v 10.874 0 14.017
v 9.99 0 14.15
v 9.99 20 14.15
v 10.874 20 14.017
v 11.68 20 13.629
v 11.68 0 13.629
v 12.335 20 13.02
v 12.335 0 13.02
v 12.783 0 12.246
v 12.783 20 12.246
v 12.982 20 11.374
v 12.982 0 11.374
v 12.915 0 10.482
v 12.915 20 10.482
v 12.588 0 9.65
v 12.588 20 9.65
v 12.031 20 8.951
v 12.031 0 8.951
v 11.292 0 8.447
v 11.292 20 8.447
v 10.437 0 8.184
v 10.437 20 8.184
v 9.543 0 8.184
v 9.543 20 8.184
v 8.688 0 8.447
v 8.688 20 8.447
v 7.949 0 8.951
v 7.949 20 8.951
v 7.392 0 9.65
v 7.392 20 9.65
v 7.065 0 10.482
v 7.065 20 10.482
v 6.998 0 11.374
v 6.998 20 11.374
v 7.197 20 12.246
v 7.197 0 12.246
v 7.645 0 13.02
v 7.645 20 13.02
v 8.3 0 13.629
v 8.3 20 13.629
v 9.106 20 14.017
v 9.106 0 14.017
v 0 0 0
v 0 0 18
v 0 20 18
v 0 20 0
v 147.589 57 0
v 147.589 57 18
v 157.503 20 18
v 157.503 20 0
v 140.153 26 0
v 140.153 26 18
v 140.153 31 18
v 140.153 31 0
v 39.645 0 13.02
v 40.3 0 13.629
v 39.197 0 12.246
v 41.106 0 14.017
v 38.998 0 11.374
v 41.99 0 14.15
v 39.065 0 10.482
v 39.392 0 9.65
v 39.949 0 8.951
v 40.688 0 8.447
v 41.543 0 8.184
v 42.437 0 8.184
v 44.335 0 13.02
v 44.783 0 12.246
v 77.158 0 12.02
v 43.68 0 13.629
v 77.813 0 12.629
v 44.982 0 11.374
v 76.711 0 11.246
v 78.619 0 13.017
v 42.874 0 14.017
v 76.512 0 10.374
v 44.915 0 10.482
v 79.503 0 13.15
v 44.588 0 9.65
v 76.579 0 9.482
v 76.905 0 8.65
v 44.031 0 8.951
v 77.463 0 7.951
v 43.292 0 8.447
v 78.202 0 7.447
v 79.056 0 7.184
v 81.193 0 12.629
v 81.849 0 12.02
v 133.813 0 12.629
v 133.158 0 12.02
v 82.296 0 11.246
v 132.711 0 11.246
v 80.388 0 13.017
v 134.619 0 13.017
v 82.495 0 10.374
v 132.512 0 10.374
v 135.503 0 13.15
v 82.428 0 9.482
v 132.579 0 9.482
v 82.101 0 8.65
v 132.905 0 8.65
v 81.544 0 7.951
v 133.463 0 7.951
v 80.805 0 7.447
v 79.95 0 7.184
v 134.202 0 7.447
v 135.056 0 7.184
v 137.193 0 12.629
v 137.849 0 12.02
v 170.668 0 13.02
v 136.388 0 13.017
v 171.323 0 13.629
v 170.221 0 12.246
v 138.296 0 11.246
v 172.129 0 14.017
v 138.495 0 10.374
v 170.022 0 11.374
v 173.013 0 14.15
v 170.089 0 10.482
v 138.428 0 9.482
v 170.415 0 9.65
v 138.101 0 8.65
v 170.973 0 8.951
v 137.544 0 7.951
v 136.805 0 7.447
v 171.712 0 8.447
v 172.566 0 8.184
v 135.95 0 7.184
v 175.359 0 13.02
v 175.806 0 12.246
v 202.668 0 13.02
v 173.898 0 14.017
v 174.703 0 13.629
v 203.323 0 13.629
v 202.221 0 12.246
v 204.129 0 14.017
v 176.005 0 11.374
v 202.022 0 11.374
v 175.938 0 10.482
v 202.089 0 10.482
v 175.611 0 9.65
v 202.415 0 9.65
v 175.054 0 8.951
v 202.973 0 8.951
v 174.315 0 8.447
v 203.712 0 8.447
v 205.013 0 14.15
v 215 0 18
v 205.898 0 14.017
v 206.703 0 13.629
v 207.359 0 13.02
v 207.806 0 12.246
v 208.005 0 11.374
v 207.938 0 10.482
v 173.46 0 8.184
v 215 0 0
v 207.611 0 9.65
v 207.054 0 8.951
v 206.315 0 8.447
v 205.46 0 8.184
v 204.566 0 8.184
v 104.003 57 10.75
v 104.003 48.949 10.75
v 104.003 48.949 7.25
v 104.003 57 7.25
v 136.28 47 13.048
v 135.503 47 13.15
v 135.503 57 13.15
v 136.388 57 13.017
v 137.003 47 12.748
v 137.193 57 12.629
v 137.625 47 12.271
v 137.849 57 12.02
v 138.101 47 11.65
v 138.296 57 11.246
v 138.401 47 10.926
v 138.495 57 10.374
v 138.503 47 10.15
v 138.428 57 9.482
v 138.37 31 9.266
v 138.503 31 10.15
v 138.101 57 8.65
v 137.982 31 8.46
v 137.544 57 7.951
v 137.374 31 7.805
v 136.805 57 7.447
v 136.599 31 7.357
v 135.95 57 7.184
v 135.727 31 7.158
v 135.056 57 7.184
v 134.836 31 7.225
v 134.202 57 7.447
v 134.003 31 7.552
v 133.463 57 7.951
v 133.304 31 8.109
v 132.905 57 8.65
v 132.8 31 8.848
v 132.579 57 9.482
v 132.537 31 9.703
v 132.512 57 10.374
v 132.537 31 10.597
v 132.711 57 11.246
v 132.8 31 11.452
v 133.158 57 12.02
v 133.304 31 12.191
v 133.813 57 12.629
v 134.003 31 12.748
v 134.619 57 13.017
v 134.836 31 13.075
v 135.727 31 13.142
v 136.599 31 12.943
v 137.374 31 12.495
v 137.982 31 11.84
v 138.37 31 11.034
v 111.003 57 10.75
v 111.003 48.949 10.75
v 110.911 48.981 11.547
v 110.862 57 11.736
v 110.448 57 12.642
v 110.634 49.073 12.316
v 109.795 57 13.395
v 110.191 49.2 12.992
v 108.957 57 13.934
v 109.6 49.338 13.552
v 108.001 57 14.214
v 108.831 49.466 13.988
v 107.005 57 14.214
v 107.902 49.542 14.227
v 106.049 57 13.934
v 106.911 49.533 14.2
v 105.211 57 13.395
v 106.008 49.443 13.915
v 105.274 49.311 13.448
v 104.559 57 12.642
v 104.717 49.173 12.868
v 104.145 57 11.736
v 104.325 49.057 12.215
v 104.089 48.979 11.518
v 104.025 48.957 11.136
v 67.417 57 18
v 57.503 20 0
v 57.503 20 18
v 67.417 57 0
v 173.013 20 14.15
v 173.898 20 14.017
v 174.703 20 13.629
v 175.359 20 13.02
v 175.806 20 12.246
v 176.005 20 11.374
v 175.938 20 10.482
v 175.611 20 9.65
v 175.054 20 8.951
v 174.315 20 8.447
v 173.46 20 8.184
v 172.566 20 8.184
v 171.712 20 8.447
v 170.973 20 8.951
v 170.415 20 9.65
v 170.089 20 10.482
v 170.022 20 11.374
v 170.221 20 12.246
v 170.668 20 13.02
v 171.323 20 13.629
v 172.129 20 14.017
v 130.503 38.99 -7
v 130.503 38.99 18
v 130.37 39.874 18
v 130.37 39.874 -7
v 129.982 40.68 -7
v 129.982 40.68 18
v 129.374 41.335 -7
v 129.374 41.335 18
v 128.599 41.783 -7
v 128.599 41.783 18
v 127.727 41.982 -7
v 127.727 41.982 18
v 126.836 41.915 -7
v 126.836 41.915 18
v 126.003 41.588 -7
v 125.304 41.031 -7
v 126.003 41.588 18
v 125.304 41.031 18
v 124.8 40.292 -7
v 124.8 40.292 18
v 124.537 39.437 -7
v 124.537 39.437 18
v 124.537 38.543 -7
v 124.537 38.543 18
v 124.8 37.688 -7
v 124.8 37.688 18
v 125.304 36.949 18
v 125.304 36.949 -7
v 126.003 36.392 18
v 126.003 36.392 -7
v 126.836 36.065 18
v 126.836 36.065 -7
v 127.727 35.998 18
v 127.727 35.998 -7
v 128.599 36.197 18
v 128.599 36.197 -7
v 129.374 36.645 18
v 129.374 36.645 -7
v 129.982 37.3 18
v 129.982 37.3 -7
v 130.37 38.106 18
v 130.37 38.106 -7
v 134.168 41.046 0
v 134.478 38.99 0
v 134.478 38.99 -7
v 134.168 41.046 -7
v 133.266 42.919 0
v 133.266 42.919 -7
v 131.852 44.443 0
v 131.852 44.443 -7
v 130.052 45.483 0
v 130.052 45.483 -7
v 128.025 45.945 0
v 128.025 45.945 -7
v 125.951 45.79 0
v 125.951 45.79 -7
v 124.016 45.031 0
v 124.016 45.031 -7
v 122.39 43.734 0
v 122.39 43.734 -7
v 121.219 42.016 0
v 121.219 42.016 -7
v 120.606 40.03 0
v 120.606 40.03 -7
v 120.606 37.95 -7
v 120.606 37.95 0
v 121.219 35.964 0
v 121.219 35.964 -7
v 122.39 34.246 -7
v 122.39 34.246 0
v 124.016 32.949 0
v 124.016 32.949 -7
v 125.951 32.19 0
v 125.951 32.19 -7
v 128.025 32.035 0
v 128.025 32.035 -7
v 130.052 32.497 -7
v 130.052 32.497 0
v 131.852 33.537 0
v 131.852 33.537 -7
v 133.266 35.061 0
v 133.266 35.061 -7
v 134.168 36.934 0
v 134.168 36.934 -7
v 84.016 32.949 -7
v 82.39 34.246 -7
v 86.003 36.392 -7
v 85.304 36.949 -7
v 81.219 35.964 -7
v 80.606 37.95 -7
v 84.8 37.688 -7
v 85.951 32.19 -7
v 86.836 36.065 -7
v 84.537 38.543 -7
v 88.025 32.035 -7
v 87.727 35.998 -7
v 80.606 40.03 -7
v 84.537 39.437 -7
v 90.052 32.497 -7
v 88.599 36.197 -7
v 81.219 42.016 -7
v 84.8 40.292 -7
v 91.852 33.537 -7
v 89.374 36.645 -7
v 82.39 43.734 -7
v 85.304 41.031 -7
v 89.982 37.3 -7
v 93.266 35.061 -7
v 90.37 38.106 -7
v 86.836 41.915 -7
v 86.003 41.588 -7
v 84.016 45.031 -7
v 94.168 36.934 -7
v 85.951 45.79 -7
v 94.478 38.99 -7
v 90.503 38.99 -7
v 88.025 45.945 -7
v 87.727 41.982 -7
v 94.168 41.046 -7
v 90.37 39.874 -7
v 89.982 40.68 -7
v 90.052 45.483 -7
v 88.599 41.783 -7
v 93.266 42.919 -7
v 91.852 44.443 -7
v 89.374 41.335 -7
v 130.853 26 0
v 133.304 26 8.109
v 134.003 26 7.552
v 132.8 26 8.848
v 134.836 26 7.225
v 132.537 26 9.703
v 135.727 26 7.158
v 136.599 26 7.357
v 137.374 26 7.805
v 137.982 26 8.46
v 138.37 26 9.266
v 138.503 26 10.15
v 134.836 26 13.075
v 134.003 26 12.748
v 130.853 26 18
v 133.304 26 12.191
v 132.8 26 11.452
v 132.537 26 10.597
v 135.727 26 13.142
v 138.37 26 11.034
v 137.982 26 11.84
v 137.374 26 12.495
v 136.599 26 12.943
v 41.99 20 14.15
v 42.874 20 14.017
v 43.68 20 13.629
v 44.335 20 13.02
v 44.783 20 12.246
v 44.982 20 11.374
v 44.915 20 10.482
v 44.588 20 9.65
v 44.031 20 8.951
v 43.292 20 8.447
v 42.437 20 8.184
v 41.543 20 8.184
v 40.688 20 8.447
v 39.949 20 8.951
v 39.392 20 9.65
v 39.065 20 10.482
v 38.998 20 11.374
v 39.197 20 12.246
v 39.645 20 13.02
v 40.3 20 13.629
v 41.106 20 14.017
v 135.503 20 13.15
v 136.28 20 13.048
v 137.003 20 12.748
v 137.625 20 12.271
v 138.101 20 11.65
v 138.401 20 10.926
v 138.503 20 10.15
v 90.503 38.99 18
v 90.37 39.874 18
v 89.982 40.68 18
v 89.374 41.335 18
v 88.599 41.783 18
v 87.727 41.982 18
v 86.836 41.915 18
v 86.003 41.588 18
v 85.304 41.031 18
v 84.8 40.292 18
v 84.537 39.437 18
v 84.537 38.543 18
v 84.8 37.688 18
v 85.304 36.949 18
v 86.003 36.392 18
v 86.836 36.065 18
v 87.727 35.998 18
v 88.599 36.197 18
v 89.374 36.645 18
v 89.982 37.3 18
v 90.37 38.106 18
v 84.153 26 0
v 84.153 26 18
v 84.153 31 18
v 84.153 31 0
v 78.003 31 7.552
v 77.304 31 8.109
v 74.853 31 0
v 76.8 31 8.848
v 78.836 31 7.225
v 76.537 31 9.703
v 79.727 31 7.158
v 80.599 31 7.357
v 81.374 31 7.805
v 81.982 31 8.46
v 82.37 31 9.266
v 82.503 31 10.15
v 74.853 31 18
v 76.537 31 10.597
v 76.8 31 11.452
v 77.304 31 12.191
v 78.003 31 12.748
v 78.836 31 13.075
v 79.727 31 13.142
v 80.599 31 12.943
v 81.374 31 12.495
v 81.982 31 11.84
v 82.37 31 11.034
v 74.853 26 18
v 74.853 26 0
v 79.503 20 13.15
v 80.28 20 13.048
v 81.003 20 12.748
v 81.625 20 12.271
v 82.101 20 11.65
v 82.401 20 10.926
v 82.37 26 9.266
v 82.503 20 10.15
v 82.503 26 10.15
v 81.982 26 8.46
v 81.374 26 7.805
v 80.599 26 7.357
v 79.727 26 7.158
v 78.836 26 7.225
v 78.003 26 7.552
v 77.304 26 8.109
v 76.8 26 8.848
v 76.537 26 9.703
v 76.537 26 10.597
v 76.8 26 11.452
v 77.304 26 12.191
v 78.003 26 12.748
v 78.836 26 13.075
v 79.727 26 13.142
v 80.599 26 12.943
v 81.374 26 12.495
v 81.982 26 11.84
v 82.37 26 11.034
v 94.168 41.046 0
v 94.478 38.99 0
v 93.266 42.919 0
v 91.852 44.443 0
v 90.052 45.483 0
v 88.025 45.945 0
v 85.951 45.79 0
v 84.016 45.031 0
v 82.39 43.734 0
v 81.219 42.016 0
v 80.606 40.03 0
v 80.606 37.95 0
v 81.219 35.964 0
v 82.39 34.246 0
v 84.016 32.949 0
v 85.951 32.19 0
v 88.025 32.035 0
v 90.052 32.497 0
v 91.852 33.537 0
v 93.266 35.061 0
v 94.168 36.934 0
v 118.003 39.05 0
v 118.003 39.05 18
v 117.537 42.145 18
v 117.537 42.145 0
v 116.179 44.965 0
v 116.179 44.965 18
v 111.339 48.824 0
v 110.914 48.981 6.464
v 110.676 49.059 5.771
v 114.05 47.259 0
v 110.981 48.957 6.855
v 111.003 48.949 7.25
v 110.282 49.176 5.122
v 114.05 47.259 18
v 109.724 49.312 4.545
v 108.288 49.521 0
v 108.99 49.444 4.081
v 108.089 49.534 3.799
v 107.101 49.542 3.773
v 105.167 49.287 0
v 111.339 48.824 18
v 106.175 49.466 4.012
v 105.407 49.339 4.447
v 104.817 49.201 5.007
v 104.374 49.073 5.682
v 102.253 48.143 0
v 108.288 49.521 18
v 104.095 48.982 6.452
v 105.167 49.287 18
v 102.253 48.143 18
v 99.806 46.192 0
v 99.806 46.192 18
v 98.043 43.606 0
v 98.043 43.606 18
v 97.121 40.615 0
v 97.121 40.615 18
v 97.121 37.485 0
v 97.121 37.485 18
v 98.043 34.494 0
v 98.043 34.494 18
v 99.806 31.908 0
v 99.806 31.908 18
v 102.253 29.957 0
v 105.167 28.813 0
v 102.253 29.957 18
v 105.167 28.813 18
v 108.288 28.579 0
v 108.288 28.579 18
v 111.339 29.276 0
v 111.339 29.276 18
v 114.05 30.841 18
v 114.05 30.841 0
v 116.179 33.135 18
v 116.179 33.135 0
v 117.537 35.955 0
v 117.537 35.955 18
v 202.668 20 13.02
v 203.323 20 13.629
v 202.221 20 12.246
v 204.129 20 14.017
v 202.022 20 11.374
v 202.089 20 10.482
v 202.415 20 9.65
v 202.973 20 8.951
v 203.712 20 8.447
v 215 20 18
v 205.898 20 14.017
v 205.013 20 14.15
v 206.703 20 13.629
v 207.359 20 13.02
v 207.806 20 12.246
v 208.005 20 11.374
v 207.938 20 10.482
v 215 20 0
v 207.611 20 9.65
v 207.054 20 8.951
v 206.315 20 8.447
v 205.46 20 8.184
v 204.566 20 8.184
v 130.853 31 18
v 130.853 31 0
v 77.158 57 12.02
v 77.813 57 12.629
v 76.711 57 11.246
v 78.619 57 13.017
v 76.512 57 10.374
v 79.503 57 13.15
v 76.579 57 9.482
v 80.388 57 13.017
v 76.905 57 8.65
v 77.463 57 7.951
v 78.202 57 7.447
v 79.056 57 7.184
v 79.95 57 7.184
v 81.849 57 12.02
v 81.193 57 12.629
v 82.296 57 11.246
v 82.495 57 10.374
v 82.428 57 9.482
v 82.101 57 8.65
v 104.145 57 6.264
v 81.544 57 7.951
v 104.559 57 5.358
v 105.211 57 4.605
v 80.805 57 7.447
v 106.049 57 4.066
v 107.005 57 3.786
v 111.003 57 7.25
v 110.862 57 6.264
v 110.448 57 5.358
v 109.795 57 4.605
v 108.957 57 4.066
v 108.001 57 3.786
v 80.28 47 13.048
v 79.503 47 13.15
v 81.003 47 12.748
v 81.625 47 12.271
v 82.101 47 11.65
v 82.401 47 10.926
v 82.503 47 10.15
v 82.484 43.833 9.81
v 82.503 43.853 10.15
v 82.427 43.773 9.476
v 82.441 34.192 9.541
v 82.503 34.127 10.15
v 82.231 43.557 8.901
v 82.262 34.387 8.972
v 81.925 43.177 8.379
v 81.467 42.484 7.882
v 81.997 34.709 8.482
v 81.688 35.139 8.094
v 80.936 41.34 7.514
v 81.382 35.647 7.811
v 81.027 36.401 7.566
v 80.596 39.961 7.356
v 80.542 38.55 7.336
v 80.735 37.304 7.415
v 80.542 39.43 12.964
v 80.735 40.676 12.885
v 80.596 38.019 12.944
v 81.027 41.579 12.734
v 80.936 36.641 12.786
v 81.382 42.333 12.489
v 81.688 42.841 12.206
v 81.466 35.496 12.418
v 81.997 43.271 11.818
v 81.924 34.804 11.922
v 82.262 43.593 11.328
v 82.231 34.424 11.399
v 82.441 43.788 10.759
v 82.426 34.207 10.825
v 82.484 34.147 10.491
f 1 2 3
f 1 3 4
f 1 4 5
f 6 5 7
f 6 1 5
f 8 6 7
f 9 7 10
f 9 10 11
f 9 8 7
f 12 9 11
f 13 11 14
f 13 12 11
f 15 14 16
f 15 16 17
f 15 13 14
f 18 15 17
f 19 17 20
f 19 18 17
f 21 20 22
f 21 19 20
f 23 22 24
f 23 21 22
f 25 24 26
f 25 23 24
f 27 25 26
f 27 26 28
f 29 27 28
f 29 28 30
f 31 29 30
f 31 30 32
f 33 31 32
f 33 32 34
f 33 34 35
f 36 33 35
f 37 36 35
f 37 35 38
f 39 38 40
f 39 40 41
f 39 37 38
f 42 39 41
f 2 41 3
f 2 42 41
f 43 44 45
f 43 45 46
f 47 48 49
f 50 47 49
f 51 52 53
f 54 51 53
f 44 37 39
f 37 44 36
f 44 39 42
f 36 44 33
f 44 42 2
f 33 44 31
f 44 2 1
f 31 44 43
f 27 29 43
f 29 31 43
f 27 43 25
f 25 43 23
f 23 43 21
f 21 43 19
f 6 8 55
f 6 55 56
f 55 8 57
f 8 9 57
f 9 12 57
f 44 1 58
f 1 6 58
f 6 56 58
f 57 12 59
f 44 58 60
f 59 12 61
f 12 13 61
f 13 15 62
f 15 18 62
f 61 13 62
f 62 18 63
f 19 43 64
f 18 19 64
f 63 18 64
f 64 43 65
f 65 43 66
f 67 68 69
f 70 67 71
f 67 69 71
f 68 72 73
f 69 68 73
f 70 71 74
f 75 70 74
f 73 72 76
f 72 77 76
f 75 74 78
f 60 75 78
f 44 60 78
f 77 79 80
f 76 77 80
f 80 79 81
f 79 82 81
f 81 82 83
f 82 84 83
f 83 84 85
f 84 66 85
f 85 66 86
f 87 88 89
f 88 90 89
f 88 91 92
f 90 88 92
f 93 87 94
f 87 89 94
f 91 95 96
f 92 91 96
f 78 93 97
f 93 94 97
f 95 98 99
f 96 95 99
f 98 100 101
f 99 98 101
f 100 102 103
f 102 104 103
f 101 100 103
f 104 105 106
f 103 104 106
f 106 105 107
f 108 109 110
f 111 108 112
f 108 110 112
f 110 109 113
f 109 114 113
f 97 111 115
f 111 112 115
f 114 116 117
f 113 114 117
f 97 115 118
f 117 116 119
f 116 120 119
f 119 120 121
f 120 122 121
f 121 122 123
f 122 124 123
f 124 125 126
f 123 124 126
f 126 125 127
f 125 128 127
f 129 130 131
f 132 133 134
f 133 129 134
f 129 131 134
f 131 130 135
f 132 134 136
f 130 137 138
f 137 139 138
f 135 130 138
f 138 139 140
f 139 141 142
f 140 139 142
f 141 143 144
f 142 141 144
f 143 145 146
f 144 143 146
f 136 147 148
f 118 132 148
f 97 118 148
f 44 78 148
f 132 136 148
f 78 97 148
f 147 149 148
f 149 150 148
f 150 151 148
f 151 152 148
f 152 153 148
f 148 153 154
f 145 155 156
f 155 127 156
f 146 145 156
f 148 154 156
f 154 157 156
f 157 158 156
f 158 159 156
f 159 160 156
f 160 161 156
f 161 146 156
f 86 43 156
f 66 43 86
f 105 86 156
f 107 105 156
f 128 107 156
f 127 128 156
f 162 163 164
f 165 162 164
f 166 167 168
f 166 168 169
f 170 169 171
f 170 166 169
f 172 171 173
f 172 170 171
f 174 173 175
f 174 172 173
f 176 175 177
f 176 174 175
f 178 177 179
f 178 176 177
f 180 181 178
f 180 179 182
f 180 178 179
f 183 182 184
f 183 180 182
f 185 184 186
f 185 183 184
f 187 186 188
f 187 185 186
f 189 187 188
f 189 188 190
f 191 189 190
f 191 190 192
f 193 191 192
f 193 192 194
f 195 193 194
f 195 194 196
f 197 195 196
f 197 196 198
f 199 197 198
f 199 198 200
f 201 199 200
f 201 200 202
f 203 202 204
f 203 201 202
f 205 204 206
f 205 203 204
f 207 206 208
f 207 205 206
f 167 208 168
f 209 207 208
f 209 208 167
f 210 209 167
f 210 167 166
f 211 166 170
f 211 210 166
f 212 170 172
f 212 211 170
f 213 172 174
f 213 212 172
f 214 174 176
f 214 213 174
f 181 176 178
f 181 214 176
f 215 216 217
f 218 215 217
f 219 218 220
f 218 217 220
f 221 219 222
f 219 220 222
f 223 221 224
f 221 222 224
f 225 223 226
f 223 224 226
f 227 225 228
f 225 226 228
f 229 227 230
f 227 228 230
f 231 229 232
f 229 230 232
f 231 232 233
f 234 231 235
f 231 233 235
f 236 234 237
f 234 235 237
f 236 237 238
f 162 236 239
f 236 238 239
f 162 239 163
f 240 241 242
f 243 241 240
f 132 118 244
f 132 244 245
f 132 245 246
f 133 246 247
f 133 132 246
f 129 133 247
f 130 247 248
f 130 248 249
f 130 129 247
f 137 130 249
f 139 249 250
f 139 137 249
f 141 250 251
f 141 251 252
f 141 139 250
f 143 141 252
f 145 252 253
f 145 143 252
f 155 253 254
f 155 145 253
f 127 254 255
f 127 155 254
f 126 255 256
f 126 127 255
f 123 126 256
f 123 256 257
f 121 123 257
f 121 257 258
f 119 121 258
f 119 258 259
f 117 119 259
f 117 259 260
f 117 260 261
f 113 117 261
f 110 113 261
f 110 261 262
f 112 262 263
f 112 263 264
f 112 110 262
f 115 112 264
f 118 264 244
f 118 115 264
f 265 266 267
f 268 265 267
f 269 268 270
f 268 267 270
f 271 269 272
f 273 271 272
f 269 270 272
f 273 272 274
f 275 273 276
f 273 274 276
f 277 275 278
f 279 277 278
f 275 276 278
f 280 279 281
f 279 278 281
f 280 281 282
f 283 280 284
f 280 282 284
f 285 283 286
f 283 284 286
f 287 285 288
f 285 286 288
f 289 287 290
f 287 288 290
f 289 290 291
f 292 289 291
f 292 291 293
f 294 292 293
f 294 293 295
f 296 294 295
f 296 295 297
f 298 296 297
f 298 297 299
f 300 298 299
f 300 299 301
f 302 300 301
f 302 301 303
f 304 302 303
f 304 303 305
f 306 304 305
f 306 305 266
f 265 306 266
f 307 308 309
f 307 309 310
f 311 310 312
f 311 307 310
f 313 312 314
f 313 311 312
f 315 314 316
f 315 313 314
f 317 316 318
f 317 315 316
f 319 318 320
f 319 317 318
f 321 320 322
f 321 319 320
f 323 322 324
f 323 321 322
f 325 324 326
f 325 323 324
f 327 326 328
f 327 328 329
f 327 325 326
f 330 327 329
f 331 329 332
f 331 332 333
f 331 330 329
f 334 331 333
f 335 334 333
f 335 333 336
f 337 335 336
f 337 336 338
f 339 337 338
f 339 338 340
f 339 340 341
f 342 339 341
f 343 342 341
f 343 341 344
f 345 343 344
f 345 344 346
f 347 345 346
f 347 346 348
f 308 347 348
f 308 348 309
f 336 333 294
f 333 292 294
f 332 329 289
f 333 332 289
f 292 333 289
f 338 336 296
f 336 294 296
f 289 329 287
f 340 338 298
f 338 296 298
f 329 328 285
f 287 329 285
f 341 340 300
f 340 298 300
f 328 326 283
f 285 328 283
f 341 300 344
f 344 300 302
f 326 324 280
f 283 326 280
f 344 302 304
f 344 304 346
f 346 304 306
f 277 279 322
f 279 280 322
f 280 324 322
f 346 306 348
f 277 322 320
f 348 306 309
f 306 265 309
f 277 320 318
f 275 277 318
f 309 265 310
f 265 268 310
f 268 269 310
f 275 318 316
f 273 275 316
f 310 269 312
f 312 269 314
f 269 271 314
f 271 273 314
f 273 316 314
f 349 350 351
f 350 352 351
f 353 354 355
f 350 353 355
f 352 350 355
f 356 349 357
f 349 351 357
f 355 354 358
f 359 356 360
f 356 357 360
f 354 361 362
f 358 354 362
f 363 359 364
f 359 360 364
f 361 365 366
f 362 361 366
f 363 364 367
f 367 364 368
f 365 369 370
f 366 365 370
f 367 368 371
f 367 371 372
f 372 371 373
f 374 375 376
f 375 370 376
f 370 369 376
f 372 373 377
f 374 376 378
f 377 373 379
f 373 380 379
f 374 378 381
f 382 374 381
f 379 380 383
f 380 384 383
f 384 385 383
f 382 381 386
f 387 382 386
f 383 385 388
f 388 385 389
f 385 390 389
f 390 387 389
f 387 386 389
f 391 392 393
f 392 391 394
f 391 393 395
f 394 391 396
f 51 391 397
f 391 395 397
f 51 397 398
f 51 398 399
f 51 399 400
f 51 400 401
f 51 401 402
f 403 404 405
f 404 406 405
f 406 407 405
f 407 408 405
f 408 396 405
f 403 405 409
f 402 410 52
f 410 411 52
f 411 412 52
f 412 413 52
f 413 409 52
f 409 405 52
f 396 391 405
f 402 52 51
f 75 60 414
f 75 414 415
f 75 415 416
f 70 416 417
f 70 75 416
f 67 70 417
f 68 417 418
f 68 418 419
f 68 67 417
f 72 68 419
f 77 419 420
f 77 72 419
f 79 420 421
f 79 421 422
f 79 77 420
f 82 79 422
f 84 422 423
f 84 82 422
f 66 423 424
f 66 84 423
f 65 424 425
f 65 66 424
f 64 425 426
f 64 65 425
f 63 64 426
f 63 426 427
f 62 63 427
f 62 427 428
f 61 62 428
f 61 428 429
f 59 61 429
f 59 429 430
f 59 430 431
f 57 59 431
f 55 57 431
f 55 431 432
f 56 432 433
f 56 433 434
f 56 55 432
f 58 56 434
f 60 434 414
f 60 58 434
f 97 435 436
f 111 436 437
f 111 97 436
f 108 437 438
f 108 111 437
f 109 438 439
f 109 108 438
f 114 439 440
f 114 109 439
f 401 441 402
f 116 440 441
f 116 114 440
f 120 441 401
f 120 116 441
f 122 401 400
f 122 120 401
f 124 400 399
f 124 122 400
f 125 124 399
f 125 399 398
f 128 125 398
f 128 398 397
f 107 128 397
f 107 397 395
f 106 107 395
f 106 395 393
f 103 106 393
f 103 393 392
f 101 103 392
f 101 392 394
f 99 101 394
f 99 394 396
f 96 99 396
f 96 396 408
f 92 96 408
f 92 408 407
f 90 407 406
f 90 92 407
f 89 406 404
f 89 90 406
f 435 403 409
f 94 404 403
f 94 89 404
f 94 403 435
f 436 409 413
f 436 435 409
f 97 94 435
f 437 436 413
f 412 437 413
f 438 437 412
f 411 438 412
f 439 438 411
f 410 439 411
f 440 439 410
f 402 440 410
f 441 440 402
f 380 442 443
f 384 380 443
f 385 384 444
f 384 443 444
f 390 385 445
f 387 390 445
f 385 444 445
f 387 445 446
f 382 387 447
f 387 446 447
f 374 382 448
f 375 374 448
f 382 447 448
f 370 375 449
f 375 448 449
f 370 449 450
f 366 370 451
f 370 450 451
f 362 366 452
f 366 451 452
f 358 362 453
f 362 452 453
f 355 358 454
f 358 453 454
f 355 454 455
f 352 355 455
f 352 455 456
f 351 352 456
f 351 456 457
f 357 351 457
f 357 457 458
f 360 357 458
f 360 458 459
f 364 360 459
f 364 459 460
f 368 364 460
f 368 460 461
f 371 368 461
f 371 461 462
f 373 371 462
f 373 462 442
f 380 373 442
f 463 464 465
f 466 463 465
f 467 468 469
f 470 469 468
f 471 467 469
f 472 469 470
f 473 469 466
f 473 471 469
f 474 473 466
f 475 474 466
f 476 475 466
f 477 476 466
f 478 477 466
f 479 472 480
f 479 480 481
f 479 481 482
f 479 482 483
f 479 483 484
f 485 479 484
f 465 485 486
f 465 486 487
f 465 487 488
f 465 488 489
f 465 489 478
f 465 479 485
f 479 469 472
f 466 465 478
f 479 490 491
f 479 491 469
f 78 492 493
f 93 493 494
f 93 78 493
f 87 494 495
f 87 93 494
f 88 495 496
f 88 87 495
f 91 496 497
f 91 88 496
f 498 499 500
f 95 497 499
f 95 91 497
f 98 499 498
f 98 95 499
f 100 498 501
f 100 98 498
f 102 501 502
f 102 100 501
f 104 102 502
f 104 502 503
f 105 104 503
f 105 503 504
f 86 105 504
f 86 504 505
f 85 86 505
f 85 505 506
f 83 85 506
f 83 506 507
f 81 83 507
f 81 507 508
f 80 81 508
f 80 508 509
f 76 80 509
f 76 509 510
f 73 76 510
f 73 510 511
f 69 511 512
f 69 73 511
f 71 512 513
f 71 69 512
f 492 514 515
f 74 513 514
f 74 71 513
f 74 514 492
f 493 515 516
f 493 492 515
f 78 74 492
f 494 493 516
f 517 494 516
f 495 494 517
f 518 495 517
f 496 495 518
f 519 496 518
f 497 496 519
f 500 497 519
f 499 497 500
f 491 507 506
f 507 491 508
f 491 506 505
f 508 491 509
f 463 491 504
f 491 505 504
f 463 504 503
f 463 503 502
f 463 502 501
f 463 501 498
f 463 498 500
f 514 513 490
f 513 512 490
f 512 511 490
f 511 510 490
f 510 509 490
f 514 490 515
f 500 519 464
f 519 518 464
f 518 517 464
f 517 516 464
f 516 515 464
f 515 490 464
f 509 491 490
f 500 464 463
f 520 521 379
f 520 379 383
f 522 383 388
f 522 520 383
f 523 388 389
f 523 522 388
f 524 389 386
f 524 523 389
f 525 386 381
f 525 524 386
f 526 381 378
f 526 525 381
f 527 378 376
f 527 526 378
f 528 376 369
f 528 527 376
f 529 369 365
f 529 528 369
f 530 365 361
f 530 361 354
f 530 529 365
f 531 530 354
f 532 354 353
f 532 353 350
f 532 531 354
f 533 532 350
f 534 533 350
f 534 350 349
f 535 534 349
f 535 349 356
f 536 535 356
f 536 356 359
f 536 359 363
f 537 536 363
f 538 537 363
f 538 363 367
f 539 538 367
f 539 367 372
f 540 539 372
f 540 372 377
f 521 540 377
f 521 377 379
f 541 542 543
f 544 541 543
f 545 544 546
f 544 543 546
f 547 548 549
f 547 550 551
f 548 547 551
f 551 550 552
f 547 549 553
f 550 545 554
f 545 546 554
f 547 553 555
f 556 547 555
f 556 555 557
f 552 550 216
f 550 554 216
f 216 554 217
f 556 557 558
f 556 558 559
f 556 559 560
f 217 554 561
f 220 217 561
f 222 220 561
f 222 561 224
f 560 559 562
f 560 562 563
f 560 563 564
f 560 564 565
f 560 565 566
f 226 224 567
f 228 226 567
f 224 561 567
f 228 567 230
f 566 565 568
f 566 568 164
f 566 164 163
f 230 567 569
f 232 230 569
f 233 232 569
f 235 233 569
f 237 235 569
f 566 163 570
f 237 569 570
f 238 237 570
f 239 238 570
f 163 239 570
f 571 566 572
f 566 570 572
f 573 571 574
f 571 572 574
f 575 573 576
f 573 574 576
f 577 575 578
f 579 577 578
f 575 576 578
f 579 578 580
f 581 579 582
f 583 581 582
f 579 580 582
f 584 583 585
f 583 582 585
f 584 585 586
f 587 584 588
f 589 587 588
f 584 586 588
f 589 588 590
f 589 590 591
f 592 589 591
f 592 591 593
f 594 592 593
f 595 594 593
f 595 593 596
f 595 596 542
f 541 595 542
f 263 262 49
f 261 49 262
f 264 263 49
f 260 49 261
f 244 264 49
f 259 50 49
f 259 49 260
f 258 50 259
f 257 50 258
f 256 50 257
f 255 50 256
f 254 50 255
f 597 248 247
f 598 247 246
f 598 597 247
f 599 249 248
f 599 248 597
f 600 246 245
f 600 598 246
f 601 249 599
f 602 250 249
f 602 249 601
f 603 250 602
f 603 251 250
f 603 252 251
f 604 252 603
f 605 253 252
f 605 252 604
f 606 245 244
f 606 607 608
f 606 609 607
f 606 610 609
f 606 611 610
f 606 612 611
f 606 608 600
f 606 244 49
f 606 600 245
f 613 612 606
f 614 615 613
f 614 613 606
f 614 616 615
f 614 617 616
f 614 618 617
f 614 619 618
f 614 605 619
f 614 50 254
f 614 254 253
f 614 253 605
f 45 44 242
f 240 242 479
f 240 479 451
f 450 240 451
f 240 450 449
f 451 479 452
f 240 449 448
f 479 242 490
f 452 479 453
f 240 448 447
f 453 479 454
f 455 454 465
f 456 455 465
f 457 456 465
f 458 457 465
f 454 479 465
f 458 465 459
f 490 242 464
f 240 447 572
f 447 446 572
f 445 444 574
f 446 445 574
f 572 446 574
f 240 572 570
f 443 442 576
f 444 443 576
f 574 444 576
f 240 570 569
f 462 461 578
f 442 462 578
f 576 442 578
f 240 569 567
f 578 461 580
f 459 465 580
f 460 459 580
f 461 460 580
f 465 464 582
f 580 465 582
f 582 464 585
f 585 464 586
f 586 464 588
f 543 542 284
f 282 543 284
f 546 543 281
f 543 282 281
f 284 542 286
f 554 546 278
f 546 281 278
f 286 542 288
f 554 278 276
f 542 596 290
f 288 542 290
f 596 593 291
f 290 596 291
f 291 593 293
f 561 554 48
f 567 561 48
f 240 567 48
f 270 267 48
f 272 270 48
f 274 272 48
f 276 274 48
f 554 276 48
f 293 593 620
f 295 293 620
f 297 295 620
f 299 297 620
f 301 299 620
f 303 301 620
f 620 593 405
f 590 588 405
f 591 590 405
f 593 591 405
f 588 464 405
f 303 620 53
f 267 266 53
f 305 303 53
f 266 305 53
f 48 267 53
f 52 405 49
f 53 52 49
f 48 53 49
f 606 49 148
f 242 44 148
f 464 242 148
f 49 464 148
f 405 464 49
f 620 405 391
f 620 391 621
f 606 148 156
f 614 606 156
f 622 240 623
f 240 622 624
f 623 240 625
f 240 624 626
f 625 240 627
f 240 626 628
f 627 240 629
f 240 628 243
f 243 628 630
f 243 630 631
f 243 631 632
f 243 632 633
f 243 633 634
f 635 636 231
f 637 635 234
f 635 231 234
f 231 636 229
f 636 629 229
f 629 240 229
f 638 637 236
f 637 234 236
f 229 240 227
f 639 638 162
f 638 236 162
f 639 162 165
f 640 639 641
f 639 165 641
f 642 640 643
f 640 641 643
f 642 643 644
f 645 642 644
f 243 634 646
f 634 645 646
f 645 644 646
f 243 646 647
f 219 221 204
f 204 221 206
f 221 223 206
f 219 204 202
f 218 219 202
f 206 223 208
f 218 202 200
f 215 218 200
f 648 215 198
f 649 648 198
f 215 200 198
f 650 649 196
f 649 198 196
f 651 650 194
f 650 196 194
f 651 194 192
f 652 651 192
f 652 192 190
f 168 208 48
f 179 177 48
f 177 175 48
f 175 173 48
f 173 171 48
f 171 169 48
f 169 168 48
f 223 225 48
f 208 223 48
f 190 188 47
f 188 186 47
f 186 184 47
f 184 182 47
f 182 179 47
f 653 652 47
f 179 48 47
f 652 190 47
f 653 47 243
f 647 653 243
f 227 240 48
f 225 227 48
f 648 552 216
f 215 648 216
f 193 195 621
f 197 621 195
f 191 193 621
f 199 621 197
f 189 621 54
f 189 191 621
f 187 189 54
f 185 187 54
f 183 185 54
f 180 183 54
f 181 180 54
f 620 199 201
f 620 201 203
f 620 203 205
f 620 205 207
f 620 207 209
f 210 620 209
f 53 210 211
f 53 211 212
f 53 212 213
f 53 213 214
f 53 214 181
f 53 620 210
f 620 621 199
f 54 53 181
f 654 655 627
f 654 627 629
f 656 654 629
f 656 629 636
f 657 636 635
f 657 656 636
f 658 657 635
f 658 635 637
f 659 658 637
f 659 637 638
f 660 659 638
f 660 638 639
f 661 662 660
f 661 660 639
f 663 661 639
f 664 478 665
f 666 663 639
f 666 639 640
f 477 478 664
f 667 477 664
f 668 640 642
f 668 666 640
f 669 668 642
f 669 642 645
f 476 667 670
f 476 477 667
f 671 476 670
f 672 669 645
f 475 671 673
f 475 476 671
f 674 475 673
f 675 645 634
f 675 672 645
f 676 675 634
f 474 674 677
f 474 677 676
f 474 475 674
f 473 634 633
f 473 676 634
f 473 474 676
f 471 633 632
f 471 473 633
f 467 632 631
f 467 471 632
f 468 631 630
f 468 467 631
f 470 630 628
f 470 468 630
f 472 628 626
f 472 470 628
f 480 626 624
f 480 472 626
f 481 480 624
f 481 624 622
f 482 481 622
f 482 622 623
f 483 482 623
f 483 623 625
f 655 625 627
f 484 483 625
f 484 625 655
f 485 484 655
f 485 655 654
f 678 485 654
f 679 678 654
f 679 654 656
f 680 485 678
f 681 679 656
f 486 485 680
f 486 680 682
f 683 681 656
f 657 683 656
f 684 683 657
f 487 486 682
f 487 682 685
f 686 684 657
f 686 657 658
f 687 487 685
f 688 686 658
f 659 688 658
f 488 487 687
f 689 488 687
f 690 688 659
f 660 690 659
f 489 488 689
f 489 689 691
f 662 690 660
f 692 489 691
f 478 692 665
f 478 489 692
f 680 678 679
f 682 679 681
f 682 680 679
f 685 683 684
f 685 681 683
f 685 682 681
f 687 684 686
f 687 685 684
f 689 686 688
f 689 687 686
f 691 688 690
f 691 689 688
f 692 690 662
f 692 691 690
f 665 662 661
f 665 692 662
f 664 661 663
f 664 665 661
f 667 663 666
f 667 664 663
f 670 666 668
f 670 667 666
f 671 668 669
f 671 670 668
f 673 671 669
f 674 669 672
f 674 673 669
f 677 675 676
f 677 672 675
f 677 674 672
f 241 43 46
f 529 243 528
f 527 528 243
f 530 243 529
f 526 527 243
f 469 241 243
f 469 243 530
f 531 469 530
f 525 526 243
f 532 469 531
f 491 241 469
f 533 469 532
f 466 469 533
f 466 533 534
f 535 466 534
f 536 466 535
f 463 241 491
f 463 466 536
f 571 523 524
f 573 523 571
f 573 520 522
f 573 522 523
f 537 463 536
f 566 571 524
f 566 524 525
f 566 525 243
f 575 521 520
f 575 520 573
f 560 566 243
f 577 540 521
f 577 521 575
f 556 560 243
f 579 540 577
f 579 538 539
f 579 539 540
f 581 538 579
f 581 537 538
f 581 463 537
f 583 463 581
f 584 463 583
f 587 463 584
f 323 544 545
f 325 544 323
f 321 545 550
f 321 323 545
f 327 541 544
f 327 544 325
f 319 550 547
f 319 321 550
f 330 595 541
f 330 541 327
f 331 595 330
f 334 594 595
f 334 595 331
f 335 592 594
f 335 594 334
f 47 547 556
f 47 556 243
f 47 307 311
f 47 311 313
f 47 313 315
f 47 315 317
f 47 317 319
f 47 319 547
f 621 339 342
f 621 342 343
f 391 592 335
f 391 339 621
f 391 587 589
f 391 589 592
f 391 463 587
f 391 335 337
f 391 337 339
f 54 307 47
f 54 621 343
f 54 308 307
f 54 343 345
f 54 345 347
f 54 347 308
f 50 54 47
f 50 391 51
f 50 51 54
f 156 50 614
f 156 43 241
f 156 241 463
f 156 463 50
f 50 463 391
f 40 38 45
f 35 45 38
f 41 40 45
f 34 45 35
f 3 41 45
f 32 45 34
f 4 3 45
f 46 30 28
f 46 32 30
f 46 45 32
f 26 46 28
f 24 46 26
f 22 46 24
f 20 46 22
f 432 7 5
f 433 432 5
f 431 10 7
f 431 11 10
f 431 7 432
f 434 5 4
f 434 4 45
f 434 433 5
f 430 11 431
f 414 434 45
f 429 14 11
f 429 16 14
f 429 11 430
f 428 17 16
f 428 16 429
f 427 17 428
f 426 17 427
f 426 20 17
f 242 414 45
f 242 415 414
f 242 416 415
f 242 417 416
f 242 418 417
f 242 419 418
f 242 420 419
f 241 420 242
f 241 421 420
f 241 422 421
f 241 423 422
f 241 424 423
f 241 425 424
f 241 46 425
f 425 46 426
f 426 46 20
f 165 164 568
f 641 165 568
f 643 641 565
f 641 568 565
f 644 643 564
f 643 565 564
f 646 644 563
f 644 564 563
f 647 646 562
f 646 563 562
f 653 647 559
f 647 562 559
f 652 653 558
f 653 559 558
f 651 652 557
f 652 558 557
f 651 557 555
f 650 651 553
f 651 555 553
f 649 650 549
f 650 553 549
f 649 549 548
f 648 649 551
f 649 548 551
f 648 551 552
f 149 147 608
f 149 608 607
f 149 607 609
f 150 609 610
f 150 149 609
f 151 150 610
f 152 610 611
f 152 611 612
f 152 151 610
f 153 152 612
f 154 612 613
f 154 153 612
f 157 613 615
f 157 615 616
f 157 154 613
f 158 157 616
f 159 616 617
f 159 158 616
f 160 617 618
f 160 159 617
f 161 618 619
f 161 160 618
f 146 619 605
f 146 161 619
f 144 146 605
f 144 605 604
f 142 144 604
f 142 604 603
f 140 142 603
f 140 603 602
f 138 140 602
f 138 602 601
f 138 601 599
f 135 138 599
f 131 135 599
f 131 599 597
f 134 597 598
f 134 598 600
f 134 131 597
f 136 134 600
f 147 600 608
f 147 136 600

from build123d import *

# Parameters (mm, degrees)
SKETCH1_W           = 215
SKETCH1_H           = 18
SKETCH1_R           = 3
BOSS_EXTRUDE1_DEPTH = 20
SKETCH1_3_W         = 80
SKETCH1_3_H         = 18
SKETCH1_3_R         = 3
BOSS_EXTRUDE2_DEPTH = 47
BOSS_EXTRUDE3_START = 47
SKETCH1_6_W         = 25
SKETCH1_6_H         = 18
SKETCH1_6_W_2       = 27.5
SKETCH1_6_R         = 3
BOSS_EXTRUDE3_DEPTH = 10
SKETCH2_R           = 6.975
SKETCH2_R_2         = 4.475
SKETCH2_R_3         = 3
BOSS_EXTRUDE4_DEPTH = 25
SKETCH2_6_R         = 10.5
SKETCH2_6_R_2       = 3
SKETCH2_6_W         = 9.3
SKETCH2_6_H         = 5
CUT_EXTRUDE5_DEPTH  = 224.828059035
SKETCH1_8_R         = 3
CUT_EXTRUDE6_DEPTH  = 57
CHAMFER1_SIZE       = 37.320508076
CHAMFER1_SIZE_2     = 10
CHAMFER2_SIZE       = 10
CHAMFER2_SIZE_2     = 37.320508076


with BuildPart() as part:
    # Sketch1 → Boss-Extrude1 (new body)
    with BuildSketch(Plane(origin=(0, 0, 0), x_dir=(1, 0, 0), z_dir=(0, 1, 0))):
        with Locations((107.5, -9)):
            Rectangle(SKETCH1_W, SKETCH1_H)
        with Locations(Location((9.99, -11.15, 0), (0, 0, 270))):
            Circle(SKETCH1_R, mode=Mode.SUBTRACT)
        with Locations(Location((41.99, -11.15, 0), (0, 0, 270))):
            Circle(SKETCH1_R, mode=Mode.SUBTRACT)
        with Locations(Location((79.5033, -10.15, 0), (0, 0, 270))):
            Circle(SKETCH1_R, mode=Mode.SUBTRACT)
        with Locations(Location((135.5033, -10.15, 0), (0, 0, 270))):
            Circle(SKETCH1_R, mode=Mode.SUBTRACT)
        with Locations(Location((173.0133, -11.15, 0), (0, 0, 270))):
            Circle(SKETCH1_R, mode=Mode.SUBTRACT)
        with Locations(Location((205.0133, -11.15, 0), (0, 0, 270))):
            Circle(SKETCH1_R, mode=Mode.SUBTRACT)
    extrude(amount=BOSS_EXTRUDE1_DEPTH)

    # Sketch1<3> → Boss-Extrude2 (add)
    with BuildSketch(Plane(origin=(0, 0, 0), x_dir=(1, 0, 0), z_dir=(0, 1, 0))):
        with Locations((107.5033, -9)):
            Rectangle(SKETCH1_3_W, SKETCH1_3_H)
        with Locations((79.5033, -10.15)):
            Circle(SKETCH1_3_R, mode=Mode.SUBTRACT)
        with Locations((135.5033, -10.15)):
            Circle(SKETCH1_3_R, mode=Mode.SUBTRACT)
    extrude(amount=BOSS_EXTRUDE2_DEPTH)

    # Sketch1<6> → Boss-Extrude3 (add)
    # profile 1 of 3: a face of its own
    with BuildSketch(Plane(origin=(0, 0, 0), x_dir=(1, 0, 0), z_dir=(0, 1, 0)).offset(BOSS_EXTRUDE3_START)):
        with Locations((107.5033, -9)):
            Rectangle(SKETCH1_6_W, SKETCH1_6_H)
        with BuildLine():
            ThreePointArc((111.0033, -10.75), (107.5033, -14.25), (104.0033, -10.75))
            Line((104.0033, -10.75), (104.0033, -7.25))
            ThreePointArc((104.0033, -7.25), (107.5033, -3.75), (111.0033, -7.25))
            Line((111.0033, -7.25), (111.0033, -10.75))
        make_face(mode=Mode.SUBTRACT)
    # profile 2 of 3: a face of its own
    with BuildSketch(Plane(origin=(0, 0, 0), x_dir=(1, 0, 0), z_dir=(0, 1, 0)).offset(BOSS_EXTRUDE3_START)):
        with Locations((81.2533, -9)):
            Rectangle(SKETCH1_6_W_2, SKETCH1_6_H)
        with Locations(Location((79.5033, -10.15, 0), (0, 0, 270))):
            Circle(SKETCH1_6_R, mode=Mode.SUBTRACT)
    # profile 3 of 3: a face of its own
    with BuildSketch(Plane(origin=(0, 0, 0), x_dir=(1, 0, 0), z_dir=(0, 1, 0)).offset(BOSS_EXTRUDE3_START)):
        with Locations((133.7533, -9)):
            Rectangle(SKETCH1_6_W_2, SKETCH1_6_H)
        with Locations(Location((135.5033, -10.15, 0), (0, 0, 270))):
            Circle(SKETCH1_6_R, mode=Mode.SUBTRACT)
    extrude(amount=BOSS_EXTRUDE3_DEPTH)

    # Sketch2 → Boss-Extrude4 (add)
    # profile 1 of 4: a face of its own
    with BuildSketch(Plane.XY.offset(18)):
        with Locations((87.5033, 38.99)):
            Circle(SKETCH2_R)
        with Locations((87.5033, 38.99)):
            Circle(SKETCH2_R_2, mode=Mode.SUBTRACT)
    # profile 2 of 4: a face of its own
    with BuildSketch(Plane.XY.offset(18)):
        with Locations((87.5033, 38.99)):
            Circle(SKETCH2_R_2)
        with Locations((87.5033, 38.99)):
            Circle(SKETCH2_R_3, mode=Mode.SUBTRACT)
    # profile 3 of 4: a face of its own
    with BuildSketch(Plane.XY.offset(18)):
        with Locations((127.5033, 38.99)):
            Circle(SKETCH2_R)
        with Locations((127.5033, 38.99)):
            Circle(SKETCH2_R_2, mode=Mode.SUBTRACT)
    # profile 4 of 4: a face of its own
    with BuildSketch(Plane.XY.offset(18)):
        with Locations((127.5033, 38.99)):
            Circle(SKETCH2_R_2)
        with Locations((127.5033, 38.99)):
            Circle(SKETCH2_R_3, mode=Mode.SUBTRACT)
    extrude(amount=-BOSS_EXTRUDE4_DEPTH)

    # Sketch2<6> → Cut-Extrude5 (cut, through all)
    with BuildSketch(Plane.XY.offset(18)):
        with Locations((107.5033, 39.05)):
            Circle(SKETCH2_6_R)
        with Locations((87.5033, 38.99)):
            Circle(SKETCH2_6_R_2)
        with Locations((79.5033, 28.5)):
            Rectangle(SKETCH2_6_W, SKETCH2_6_H)
        with Locations((127.5033, 38.99)):
            Circle(SKETCH2_6_R_2)
        with Locations((135.5033, 28.5)):
            Rectangle(SKETCH2_6_W, SKETCH2_6_H)
    extrude(amount=-CUT_EXTRUDE5_DEPTH, mode=Mode.SUBTRACT)

    # Sketch1<8> → Cut-Extrude6 (cut)
    with BuildSketch(Plane(origin=(0, 0, 0), x_dir=(1, 0, 0), z_dir=(0, 1, 0))):
        with Locations(Location((135.5033, -10.15, 0), (0, 0, 180))):
            Circle(SKETCH1_8_R)
        with Locations(Location((79.5033, -10.15, 0), (0, 0, 270))):
            Circle(SKETCH1_8_R)
    extrude(amount=CUT_EXTRUDE6_DEPTH, mode=Mode.SUBTRACT)

    # Chamfer1
    # the kernel refuses this chamfer: 37.320508076, 10 mm, written as the material it adds along each edge
    with BuildSketch(Plane(origin=(147.5033, 20, 18), x_dir=(-0.009967146577156421, 0.9999503267608394, 0), z_dir=(0, 0, -1))) as chamfer1_piece_1_section:
        Polygon((CHAMFER1_SIZE * 0.999950326753, CHAMFER1_SIZE * 0.00996714657707), (-CHAMFER1_SIZE_2 * 0.00996714657716, CHAMFER1_SIZE_2 * 0.999950326761), (0, 0), align=None)
    chamfer1_piece_1 = extrude(amount=18, mode=Mode.PRIVATE)
    chamfer1_piece_1 = split(chamfer1_piece_1, bisect_by=Plane(origin=(150.477287082, 57, 9), z_dir=(0, -1, 0)), keep=Keep.TOP, mode=Mode.PRIVATE)
    add(chamfer1_piece_1)

    # Chamfer2
    # the kernel refuses this chamfer: 37.320508076, 10 mm, written as the material it adds along each edge
    with BuildSketch(Plane(origin=(67.5033, 20, 0), x_dir=(-0.9905000388259542, -0.137512447021291, 0), z_dir=(0, 0, 1))) as chamfer2_piece_1_section:
        Polygon((CHAMFER2_SIZE * 0.990500038826, -CHAMFER2_SIZE * 0.137512447021), (-CHAMFER2_SIZE_2 * 0.13751244702, -CHAMFER2_SIZE_2 * 0.990500038818), (0, 0), align=None)
    chamfer2_piece_1 = extrude(amount=18, mode=Mode.PRIVATE)
    chamfer2_piece_1 = split(chamfer2_piece_1, bisect_by=Plane(origin=(64.529312918, 57, 9), z_dir=(0, -1, 0)), keep=Keep.TOP, mode=Mode.PRIVATE)
    add(chamfer2_piece_1)


solid = part.part
